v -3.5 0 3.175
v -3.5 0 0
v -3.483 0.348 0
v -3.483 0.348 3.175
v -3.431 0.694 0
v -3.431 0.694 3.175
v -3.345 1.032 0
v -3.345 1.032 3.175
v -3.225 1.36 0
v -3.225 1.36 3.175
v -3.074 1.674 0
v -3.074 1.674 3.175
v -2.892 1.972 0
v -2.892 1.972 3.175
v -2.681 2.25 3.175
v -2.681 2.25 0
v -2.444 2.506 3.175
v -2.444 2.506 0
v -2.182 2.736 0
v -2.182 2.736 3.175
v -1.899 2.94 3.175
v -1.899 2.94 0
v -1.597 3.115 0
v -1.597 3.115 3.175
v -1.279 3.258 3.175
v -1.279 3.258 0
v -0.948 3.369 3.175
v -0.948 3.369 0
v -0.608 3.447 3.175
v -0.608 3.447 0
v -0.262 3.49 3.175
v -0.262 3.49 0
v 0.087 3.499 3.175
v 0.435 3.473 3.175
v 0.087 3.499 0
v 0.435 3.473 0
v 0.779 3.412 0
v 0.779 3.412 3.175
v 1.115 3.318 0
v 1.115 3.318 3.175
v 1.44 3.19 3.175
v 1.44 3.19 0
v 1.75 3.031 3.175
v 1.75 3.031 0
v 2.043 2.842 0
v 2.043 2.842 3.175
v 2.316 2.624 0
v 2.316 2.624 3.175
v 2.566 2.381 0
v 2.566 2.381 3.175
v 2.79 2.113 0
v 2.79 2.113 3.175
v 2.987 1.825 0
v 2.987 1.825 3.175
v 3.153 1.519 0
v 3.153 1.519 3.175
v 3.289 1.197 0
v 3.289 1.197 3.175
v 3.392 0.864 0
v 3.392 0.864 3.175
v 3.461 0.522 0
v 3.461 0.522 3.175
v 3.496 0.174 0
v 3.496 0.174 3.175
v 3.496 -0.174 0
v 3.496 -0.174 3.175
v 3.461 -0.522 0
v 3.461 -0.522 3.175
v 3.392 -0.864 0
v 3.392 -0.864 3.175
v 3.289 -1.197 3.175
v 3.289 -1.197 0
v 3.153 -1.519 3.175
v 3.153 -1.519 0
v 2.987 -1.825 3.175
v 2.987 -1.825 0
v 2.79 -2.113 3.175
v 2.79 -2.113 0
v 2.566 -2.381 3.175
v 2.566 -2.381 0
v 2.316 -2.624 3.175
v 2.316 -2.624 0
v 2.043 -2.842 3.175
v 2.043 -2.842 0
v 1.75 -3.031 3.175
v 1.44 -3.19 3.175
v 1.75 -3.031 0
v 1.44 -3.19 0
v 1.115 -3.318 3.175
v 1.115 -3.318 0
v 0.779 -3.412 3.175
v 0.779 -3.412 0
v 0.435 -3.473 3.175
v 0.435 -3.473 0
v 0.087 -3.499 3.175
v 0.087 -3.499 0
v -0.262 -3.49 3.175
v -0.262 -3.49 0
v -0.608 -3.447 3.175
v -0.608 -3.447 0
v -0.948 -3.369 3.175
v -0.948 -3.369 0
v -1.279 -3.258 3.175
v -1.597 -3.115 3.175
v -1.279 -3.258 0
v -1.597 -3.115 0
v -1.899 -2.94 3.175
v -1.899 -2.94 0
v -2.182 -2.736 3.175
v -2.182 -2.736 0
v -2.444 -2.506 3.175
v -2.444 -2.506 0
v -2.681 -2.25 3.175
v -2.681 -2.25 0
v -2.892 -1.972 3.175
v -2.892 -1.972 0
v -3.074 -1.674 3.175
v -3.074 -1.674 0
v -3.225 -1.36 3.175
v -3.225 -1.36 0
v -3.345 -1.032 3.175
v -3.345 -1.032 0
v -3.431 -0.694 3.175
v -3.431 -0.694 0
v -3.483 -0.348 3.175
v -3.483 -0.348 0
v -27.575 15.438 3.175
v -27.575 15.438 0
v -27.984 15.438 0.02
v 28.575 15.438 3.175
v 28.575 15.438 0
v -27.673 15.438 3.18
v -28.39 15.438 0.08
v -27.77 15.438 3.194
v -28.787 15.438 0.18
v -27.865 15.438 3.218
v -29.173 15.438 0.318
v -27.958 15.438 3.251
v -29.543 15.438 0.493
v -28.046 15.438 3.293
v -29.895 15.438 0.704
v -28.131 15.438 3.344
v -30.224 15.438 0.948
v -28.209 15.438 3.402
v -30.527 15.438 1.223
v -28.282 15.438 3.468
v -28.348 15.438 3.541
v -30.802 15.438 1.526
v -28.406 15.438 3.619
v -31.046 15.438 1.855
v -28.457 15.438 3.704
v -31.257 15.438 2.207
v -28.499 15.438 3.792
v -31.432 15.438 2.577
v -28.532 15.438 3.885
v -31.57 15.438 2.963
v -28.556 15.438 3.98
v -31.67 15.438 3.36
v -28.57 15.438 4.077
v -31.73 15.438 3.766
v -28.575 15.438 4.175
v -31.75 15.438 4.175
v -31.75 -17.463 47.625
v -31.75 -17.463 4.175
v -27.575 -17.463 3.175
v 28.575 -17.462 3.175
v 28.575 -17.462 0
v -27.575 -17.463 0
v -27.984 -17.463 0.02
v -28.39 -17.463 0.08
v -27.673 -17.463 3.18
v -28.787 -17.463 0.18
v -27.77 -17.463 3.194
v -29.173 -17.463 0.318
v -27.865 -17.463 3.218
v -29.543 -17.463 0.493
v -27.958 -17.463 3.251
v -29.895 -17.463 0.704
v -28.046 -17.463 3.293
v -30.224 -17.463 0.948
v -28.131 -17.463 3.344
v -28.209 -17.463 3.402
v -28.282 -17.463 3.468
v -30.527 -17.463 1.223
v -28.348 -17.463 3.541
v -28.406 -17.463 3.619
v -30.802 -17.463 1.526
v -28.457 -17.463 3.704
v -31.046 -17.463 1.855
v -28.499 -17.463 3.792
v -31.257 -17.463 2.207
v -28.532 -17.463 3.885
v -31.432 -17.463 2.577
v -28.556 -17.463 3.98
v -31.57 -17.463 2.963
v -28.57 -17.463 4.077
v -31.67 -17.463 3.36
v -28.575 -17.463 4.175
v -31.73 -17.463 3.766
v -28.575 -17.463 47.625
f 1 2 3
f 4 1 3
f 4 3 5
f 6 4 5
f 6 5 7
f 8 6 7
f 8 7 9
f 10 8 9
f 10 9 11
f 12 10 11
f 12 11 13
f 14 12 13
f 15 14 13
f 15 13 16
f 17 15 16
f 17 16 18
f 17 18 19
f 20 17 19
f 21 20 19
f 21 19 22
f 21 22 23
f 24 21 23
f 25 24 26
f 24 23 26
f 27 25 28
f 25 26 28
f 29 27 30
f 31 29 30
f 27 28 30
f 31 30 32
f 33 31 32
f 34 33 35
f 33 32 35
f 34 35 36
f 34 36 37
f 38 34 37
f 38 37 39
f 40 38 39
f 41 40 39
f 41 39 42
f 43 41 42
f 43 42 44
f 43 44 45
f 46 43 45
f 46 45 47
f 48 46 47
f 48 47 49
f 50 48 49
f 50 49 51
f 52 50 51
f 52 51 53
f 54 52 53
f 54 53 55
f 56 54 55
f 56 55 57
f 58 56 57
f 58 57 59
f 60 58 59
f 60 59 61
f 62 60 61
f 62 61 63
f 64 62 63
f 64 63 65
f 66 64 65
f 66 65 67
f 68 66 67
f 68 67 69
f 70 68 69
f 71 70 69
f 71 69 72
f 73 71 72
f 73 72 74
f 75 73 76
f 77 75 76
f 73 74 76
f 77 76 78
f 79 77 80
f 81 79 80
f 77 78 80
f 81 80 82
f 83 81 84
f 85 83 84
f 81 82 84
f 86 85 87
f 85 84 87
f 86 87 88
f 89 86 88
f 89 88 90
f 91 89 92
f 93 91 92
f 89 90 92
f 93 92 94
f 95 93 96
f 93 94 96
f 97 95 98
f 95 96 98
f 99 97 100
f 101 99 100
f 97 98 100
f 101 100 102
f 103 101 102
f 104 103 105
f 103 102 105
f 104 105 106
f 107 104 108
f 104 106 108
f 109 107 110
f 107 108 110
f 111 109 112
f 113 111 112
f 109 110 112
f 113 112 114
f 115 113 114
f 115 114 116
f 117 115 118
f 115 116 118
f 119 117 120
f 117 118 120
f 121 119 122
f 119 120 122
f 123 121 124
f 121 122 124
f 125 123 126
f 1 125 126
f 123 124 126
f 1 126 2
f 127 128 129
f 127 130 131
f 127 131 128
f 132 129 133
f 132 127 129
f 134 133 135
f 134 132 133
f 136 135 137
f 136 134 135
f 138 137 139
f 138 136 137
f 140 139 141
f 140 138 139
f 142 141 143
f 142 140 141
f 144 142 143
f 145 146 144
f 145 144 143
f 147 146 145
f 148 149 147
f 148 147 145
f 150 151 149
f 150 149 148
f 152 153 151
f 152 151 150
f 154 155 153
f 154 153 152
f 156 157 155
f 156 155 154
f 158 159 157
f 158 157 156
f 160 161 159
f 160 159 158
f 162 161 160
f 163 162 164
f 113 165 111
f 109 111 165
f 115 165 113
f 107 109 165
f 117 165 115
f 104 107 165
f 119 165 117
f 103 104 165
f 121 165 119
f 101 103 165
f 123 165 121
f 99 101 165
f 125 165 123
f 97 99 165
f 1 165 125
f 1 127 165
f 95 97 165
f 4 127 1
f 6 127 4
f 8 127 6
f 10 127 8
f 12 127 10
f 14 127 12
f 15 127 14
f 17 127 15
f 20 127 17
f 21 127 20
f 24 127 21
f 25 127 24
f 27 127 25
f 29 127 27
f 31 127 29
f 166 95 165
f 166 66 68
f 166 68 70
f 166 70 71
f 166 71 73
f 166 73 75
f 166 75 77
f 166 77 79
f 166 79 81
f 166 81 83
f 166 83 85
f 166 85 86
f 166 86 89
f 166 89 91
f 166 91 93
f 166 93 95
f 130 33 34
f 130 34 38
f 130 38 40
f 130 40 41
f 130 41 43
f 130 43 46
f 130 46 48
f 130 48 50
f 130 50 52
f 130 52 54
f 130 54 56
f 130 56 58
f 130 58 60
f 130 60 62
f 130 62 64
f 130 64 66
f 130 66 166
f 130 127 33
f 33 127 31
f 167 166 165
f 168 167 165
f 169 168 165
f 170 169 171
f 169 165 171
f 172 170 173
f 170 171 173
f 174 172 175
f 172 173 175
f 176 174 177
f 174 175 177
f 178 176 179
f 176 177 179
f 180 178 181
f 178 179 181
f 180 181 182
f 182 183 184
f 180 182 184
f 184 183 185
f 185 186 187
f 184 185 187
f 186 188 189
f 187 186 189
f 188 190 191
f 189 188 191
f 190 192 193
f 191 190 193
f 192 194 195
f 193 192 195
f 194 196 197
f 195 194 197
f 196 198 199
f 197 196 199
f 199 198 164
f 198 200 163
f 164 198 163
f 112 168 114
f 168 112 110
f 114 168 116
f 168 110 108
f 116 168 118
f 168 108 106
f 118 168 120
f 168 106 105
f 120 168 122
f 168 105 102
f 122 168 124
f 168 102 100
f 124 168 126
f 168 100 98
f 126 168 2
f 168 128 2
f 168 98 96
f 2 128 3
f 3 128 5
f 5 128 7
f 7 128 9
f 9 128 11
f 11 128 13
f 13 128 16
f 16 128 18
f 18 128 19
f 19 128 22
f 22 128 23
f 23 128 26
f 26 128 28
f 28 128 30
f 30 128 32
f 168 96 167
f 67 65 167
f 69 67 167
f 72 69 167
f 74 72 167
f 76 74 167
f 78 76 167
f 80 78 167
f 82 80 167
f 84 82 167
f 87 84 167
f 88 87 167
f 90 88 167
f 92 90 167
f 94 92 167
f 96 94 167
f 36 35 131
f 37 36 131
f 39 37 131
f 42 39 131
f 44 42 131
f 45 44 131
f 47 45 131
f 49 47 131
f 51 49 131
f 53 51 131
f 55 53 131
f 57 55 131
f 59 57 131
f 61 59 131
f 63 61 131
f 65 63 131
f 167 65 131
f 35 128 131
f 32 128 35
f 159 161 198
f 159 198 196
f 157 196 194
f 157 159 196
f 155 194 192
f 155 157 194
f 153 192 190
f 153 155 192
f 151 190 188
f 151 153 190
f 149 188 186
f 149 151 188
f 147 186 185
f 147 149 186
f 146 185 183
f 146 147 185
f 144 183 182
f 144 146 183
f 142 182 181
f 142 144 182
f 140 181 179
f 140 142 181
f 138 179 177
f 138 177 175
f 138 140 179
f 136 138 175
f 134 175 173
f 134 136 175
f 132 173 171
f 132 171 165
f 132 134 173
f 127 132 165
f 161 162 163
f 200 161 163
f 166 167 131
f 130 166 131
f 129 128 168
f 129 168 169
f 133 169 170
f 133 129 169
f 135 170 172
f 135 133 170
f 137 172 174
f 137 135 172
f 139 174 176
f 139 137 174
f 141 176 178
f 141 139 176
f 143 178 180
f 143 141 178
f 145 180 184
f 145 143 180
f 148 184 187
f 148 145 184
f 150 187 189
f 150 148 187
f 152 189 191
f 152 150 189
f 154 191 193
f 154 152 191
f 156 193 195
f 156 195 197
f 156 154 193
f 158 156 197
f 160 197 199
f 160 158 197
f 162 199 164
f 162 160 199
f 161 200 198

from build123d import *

# Parameters (mm, degrees)
SKETCH2_W                    = 57.15
SKETCH2_H                    = 34.925
BASE_FLANGE1_DEPTH           = 3.175
SKETCH23_W                   = 57.15
SKETCH23_H                   = 2.02438
CUT_EXTRUDE3_DEPTH           = 34.638521909
M6_CLEARANCE_HOLE1_D         = 7
EDGE_FLANGE2_STRIP_W         = 14.7
EDGE_FLANGE2_STRIP_H         = 3.175
EDGE_FLANGE2_STRIP_CUT_DEPTH = 32.90062
EDGE_FLANGE2_DEPTH           = 32.90062
CUT_EXTRUDE2_DEPTH           = 79.817416579


# Sheet-metal steps are written as plain solids
with BuildPart() as part:
    # Sketch2 → Base-Flange1 (new body)
    with BuildSketch(Plane.XY):
        Rectangle(SKETCH2_W, SKETCH2_H)
    extrude(amount=BASE_FLANGE1_DEPTH)

    # Sketch23 → Cut-Extrude3 (cut, through all)
    with BuildSketch(Plane.XY.offset(3.175)):
        with Locations((0, 16.45031)):
            Rectangle(SKETCH23_W, SKETCH23_H)
    extrude(amount=-CUT_EXTRUDE3_DEPTH, mode=Mode.SUBTRACT)

    # M6 Clearance Hole1 (through all)
    with Locations(Plane.XY.offset(3.175)):
        with Locations((0, 0)):
            Hole(M6_CLEARANCE_HOLE1_D / 2)

    # Edge-Flange2 strip (across the edge) → Edge-Flange2 strip cut (cut)
    with BuildSketch(Plane(origin=(-28.575, 15.43812, 3.175), x_dir=(1, 0, 0), z_dir=(0, -1, 0))):
        with Locations((-6.35, -1.5875)):
            Rectangle(EDGE_FLANGE2_STRIP_W, EDGE_FLANGE2_STRIP_H)
    extrude(amount=EDGE_FLANGE2_STRIP_CUT_DEPTH, mode=Mode.SUBTRACT)

    # Edge-Flange2 section (across the edge) → Edge-Flange2 (add)
    with BuildSketch(Plane(origin=(-28.575, 15.43812, 3.175), x_dir=(1, 0, 0), z_dir=(0, -1, 0))):
        with BuildLine():
            Line((-3.175, 1), (-3.175, 44.45))
            Line((-3.175, 44.45), (0, 44.45))
            Line((0, 44.45), (0, 1))
            ThreePointArc((0, 1), (0.292893219, 0.292893219), (1, 0))
            Line((1, 0), (1, -3.175))
            ThreePointArc((1, -3.175), (-1.952170811, -1.952170811), (-3.175, 1))
        make_face()
    extrude(amount=EDGE_FLANGE2_DEPTH)

    # Sketch20 → Cut-Extrude2 (cut, through all)
    with BuildSketch(Plane.ZY.offset(31.75)):
        Polygon((4.175, 15.43812), (47.625, -17.4625), (47.625, 15.43812), align=None)
    extrude(amount=-CUT_EXTRUDE2_DEPTH, mode=Mode.SUBTRACT)


solid = part.part
